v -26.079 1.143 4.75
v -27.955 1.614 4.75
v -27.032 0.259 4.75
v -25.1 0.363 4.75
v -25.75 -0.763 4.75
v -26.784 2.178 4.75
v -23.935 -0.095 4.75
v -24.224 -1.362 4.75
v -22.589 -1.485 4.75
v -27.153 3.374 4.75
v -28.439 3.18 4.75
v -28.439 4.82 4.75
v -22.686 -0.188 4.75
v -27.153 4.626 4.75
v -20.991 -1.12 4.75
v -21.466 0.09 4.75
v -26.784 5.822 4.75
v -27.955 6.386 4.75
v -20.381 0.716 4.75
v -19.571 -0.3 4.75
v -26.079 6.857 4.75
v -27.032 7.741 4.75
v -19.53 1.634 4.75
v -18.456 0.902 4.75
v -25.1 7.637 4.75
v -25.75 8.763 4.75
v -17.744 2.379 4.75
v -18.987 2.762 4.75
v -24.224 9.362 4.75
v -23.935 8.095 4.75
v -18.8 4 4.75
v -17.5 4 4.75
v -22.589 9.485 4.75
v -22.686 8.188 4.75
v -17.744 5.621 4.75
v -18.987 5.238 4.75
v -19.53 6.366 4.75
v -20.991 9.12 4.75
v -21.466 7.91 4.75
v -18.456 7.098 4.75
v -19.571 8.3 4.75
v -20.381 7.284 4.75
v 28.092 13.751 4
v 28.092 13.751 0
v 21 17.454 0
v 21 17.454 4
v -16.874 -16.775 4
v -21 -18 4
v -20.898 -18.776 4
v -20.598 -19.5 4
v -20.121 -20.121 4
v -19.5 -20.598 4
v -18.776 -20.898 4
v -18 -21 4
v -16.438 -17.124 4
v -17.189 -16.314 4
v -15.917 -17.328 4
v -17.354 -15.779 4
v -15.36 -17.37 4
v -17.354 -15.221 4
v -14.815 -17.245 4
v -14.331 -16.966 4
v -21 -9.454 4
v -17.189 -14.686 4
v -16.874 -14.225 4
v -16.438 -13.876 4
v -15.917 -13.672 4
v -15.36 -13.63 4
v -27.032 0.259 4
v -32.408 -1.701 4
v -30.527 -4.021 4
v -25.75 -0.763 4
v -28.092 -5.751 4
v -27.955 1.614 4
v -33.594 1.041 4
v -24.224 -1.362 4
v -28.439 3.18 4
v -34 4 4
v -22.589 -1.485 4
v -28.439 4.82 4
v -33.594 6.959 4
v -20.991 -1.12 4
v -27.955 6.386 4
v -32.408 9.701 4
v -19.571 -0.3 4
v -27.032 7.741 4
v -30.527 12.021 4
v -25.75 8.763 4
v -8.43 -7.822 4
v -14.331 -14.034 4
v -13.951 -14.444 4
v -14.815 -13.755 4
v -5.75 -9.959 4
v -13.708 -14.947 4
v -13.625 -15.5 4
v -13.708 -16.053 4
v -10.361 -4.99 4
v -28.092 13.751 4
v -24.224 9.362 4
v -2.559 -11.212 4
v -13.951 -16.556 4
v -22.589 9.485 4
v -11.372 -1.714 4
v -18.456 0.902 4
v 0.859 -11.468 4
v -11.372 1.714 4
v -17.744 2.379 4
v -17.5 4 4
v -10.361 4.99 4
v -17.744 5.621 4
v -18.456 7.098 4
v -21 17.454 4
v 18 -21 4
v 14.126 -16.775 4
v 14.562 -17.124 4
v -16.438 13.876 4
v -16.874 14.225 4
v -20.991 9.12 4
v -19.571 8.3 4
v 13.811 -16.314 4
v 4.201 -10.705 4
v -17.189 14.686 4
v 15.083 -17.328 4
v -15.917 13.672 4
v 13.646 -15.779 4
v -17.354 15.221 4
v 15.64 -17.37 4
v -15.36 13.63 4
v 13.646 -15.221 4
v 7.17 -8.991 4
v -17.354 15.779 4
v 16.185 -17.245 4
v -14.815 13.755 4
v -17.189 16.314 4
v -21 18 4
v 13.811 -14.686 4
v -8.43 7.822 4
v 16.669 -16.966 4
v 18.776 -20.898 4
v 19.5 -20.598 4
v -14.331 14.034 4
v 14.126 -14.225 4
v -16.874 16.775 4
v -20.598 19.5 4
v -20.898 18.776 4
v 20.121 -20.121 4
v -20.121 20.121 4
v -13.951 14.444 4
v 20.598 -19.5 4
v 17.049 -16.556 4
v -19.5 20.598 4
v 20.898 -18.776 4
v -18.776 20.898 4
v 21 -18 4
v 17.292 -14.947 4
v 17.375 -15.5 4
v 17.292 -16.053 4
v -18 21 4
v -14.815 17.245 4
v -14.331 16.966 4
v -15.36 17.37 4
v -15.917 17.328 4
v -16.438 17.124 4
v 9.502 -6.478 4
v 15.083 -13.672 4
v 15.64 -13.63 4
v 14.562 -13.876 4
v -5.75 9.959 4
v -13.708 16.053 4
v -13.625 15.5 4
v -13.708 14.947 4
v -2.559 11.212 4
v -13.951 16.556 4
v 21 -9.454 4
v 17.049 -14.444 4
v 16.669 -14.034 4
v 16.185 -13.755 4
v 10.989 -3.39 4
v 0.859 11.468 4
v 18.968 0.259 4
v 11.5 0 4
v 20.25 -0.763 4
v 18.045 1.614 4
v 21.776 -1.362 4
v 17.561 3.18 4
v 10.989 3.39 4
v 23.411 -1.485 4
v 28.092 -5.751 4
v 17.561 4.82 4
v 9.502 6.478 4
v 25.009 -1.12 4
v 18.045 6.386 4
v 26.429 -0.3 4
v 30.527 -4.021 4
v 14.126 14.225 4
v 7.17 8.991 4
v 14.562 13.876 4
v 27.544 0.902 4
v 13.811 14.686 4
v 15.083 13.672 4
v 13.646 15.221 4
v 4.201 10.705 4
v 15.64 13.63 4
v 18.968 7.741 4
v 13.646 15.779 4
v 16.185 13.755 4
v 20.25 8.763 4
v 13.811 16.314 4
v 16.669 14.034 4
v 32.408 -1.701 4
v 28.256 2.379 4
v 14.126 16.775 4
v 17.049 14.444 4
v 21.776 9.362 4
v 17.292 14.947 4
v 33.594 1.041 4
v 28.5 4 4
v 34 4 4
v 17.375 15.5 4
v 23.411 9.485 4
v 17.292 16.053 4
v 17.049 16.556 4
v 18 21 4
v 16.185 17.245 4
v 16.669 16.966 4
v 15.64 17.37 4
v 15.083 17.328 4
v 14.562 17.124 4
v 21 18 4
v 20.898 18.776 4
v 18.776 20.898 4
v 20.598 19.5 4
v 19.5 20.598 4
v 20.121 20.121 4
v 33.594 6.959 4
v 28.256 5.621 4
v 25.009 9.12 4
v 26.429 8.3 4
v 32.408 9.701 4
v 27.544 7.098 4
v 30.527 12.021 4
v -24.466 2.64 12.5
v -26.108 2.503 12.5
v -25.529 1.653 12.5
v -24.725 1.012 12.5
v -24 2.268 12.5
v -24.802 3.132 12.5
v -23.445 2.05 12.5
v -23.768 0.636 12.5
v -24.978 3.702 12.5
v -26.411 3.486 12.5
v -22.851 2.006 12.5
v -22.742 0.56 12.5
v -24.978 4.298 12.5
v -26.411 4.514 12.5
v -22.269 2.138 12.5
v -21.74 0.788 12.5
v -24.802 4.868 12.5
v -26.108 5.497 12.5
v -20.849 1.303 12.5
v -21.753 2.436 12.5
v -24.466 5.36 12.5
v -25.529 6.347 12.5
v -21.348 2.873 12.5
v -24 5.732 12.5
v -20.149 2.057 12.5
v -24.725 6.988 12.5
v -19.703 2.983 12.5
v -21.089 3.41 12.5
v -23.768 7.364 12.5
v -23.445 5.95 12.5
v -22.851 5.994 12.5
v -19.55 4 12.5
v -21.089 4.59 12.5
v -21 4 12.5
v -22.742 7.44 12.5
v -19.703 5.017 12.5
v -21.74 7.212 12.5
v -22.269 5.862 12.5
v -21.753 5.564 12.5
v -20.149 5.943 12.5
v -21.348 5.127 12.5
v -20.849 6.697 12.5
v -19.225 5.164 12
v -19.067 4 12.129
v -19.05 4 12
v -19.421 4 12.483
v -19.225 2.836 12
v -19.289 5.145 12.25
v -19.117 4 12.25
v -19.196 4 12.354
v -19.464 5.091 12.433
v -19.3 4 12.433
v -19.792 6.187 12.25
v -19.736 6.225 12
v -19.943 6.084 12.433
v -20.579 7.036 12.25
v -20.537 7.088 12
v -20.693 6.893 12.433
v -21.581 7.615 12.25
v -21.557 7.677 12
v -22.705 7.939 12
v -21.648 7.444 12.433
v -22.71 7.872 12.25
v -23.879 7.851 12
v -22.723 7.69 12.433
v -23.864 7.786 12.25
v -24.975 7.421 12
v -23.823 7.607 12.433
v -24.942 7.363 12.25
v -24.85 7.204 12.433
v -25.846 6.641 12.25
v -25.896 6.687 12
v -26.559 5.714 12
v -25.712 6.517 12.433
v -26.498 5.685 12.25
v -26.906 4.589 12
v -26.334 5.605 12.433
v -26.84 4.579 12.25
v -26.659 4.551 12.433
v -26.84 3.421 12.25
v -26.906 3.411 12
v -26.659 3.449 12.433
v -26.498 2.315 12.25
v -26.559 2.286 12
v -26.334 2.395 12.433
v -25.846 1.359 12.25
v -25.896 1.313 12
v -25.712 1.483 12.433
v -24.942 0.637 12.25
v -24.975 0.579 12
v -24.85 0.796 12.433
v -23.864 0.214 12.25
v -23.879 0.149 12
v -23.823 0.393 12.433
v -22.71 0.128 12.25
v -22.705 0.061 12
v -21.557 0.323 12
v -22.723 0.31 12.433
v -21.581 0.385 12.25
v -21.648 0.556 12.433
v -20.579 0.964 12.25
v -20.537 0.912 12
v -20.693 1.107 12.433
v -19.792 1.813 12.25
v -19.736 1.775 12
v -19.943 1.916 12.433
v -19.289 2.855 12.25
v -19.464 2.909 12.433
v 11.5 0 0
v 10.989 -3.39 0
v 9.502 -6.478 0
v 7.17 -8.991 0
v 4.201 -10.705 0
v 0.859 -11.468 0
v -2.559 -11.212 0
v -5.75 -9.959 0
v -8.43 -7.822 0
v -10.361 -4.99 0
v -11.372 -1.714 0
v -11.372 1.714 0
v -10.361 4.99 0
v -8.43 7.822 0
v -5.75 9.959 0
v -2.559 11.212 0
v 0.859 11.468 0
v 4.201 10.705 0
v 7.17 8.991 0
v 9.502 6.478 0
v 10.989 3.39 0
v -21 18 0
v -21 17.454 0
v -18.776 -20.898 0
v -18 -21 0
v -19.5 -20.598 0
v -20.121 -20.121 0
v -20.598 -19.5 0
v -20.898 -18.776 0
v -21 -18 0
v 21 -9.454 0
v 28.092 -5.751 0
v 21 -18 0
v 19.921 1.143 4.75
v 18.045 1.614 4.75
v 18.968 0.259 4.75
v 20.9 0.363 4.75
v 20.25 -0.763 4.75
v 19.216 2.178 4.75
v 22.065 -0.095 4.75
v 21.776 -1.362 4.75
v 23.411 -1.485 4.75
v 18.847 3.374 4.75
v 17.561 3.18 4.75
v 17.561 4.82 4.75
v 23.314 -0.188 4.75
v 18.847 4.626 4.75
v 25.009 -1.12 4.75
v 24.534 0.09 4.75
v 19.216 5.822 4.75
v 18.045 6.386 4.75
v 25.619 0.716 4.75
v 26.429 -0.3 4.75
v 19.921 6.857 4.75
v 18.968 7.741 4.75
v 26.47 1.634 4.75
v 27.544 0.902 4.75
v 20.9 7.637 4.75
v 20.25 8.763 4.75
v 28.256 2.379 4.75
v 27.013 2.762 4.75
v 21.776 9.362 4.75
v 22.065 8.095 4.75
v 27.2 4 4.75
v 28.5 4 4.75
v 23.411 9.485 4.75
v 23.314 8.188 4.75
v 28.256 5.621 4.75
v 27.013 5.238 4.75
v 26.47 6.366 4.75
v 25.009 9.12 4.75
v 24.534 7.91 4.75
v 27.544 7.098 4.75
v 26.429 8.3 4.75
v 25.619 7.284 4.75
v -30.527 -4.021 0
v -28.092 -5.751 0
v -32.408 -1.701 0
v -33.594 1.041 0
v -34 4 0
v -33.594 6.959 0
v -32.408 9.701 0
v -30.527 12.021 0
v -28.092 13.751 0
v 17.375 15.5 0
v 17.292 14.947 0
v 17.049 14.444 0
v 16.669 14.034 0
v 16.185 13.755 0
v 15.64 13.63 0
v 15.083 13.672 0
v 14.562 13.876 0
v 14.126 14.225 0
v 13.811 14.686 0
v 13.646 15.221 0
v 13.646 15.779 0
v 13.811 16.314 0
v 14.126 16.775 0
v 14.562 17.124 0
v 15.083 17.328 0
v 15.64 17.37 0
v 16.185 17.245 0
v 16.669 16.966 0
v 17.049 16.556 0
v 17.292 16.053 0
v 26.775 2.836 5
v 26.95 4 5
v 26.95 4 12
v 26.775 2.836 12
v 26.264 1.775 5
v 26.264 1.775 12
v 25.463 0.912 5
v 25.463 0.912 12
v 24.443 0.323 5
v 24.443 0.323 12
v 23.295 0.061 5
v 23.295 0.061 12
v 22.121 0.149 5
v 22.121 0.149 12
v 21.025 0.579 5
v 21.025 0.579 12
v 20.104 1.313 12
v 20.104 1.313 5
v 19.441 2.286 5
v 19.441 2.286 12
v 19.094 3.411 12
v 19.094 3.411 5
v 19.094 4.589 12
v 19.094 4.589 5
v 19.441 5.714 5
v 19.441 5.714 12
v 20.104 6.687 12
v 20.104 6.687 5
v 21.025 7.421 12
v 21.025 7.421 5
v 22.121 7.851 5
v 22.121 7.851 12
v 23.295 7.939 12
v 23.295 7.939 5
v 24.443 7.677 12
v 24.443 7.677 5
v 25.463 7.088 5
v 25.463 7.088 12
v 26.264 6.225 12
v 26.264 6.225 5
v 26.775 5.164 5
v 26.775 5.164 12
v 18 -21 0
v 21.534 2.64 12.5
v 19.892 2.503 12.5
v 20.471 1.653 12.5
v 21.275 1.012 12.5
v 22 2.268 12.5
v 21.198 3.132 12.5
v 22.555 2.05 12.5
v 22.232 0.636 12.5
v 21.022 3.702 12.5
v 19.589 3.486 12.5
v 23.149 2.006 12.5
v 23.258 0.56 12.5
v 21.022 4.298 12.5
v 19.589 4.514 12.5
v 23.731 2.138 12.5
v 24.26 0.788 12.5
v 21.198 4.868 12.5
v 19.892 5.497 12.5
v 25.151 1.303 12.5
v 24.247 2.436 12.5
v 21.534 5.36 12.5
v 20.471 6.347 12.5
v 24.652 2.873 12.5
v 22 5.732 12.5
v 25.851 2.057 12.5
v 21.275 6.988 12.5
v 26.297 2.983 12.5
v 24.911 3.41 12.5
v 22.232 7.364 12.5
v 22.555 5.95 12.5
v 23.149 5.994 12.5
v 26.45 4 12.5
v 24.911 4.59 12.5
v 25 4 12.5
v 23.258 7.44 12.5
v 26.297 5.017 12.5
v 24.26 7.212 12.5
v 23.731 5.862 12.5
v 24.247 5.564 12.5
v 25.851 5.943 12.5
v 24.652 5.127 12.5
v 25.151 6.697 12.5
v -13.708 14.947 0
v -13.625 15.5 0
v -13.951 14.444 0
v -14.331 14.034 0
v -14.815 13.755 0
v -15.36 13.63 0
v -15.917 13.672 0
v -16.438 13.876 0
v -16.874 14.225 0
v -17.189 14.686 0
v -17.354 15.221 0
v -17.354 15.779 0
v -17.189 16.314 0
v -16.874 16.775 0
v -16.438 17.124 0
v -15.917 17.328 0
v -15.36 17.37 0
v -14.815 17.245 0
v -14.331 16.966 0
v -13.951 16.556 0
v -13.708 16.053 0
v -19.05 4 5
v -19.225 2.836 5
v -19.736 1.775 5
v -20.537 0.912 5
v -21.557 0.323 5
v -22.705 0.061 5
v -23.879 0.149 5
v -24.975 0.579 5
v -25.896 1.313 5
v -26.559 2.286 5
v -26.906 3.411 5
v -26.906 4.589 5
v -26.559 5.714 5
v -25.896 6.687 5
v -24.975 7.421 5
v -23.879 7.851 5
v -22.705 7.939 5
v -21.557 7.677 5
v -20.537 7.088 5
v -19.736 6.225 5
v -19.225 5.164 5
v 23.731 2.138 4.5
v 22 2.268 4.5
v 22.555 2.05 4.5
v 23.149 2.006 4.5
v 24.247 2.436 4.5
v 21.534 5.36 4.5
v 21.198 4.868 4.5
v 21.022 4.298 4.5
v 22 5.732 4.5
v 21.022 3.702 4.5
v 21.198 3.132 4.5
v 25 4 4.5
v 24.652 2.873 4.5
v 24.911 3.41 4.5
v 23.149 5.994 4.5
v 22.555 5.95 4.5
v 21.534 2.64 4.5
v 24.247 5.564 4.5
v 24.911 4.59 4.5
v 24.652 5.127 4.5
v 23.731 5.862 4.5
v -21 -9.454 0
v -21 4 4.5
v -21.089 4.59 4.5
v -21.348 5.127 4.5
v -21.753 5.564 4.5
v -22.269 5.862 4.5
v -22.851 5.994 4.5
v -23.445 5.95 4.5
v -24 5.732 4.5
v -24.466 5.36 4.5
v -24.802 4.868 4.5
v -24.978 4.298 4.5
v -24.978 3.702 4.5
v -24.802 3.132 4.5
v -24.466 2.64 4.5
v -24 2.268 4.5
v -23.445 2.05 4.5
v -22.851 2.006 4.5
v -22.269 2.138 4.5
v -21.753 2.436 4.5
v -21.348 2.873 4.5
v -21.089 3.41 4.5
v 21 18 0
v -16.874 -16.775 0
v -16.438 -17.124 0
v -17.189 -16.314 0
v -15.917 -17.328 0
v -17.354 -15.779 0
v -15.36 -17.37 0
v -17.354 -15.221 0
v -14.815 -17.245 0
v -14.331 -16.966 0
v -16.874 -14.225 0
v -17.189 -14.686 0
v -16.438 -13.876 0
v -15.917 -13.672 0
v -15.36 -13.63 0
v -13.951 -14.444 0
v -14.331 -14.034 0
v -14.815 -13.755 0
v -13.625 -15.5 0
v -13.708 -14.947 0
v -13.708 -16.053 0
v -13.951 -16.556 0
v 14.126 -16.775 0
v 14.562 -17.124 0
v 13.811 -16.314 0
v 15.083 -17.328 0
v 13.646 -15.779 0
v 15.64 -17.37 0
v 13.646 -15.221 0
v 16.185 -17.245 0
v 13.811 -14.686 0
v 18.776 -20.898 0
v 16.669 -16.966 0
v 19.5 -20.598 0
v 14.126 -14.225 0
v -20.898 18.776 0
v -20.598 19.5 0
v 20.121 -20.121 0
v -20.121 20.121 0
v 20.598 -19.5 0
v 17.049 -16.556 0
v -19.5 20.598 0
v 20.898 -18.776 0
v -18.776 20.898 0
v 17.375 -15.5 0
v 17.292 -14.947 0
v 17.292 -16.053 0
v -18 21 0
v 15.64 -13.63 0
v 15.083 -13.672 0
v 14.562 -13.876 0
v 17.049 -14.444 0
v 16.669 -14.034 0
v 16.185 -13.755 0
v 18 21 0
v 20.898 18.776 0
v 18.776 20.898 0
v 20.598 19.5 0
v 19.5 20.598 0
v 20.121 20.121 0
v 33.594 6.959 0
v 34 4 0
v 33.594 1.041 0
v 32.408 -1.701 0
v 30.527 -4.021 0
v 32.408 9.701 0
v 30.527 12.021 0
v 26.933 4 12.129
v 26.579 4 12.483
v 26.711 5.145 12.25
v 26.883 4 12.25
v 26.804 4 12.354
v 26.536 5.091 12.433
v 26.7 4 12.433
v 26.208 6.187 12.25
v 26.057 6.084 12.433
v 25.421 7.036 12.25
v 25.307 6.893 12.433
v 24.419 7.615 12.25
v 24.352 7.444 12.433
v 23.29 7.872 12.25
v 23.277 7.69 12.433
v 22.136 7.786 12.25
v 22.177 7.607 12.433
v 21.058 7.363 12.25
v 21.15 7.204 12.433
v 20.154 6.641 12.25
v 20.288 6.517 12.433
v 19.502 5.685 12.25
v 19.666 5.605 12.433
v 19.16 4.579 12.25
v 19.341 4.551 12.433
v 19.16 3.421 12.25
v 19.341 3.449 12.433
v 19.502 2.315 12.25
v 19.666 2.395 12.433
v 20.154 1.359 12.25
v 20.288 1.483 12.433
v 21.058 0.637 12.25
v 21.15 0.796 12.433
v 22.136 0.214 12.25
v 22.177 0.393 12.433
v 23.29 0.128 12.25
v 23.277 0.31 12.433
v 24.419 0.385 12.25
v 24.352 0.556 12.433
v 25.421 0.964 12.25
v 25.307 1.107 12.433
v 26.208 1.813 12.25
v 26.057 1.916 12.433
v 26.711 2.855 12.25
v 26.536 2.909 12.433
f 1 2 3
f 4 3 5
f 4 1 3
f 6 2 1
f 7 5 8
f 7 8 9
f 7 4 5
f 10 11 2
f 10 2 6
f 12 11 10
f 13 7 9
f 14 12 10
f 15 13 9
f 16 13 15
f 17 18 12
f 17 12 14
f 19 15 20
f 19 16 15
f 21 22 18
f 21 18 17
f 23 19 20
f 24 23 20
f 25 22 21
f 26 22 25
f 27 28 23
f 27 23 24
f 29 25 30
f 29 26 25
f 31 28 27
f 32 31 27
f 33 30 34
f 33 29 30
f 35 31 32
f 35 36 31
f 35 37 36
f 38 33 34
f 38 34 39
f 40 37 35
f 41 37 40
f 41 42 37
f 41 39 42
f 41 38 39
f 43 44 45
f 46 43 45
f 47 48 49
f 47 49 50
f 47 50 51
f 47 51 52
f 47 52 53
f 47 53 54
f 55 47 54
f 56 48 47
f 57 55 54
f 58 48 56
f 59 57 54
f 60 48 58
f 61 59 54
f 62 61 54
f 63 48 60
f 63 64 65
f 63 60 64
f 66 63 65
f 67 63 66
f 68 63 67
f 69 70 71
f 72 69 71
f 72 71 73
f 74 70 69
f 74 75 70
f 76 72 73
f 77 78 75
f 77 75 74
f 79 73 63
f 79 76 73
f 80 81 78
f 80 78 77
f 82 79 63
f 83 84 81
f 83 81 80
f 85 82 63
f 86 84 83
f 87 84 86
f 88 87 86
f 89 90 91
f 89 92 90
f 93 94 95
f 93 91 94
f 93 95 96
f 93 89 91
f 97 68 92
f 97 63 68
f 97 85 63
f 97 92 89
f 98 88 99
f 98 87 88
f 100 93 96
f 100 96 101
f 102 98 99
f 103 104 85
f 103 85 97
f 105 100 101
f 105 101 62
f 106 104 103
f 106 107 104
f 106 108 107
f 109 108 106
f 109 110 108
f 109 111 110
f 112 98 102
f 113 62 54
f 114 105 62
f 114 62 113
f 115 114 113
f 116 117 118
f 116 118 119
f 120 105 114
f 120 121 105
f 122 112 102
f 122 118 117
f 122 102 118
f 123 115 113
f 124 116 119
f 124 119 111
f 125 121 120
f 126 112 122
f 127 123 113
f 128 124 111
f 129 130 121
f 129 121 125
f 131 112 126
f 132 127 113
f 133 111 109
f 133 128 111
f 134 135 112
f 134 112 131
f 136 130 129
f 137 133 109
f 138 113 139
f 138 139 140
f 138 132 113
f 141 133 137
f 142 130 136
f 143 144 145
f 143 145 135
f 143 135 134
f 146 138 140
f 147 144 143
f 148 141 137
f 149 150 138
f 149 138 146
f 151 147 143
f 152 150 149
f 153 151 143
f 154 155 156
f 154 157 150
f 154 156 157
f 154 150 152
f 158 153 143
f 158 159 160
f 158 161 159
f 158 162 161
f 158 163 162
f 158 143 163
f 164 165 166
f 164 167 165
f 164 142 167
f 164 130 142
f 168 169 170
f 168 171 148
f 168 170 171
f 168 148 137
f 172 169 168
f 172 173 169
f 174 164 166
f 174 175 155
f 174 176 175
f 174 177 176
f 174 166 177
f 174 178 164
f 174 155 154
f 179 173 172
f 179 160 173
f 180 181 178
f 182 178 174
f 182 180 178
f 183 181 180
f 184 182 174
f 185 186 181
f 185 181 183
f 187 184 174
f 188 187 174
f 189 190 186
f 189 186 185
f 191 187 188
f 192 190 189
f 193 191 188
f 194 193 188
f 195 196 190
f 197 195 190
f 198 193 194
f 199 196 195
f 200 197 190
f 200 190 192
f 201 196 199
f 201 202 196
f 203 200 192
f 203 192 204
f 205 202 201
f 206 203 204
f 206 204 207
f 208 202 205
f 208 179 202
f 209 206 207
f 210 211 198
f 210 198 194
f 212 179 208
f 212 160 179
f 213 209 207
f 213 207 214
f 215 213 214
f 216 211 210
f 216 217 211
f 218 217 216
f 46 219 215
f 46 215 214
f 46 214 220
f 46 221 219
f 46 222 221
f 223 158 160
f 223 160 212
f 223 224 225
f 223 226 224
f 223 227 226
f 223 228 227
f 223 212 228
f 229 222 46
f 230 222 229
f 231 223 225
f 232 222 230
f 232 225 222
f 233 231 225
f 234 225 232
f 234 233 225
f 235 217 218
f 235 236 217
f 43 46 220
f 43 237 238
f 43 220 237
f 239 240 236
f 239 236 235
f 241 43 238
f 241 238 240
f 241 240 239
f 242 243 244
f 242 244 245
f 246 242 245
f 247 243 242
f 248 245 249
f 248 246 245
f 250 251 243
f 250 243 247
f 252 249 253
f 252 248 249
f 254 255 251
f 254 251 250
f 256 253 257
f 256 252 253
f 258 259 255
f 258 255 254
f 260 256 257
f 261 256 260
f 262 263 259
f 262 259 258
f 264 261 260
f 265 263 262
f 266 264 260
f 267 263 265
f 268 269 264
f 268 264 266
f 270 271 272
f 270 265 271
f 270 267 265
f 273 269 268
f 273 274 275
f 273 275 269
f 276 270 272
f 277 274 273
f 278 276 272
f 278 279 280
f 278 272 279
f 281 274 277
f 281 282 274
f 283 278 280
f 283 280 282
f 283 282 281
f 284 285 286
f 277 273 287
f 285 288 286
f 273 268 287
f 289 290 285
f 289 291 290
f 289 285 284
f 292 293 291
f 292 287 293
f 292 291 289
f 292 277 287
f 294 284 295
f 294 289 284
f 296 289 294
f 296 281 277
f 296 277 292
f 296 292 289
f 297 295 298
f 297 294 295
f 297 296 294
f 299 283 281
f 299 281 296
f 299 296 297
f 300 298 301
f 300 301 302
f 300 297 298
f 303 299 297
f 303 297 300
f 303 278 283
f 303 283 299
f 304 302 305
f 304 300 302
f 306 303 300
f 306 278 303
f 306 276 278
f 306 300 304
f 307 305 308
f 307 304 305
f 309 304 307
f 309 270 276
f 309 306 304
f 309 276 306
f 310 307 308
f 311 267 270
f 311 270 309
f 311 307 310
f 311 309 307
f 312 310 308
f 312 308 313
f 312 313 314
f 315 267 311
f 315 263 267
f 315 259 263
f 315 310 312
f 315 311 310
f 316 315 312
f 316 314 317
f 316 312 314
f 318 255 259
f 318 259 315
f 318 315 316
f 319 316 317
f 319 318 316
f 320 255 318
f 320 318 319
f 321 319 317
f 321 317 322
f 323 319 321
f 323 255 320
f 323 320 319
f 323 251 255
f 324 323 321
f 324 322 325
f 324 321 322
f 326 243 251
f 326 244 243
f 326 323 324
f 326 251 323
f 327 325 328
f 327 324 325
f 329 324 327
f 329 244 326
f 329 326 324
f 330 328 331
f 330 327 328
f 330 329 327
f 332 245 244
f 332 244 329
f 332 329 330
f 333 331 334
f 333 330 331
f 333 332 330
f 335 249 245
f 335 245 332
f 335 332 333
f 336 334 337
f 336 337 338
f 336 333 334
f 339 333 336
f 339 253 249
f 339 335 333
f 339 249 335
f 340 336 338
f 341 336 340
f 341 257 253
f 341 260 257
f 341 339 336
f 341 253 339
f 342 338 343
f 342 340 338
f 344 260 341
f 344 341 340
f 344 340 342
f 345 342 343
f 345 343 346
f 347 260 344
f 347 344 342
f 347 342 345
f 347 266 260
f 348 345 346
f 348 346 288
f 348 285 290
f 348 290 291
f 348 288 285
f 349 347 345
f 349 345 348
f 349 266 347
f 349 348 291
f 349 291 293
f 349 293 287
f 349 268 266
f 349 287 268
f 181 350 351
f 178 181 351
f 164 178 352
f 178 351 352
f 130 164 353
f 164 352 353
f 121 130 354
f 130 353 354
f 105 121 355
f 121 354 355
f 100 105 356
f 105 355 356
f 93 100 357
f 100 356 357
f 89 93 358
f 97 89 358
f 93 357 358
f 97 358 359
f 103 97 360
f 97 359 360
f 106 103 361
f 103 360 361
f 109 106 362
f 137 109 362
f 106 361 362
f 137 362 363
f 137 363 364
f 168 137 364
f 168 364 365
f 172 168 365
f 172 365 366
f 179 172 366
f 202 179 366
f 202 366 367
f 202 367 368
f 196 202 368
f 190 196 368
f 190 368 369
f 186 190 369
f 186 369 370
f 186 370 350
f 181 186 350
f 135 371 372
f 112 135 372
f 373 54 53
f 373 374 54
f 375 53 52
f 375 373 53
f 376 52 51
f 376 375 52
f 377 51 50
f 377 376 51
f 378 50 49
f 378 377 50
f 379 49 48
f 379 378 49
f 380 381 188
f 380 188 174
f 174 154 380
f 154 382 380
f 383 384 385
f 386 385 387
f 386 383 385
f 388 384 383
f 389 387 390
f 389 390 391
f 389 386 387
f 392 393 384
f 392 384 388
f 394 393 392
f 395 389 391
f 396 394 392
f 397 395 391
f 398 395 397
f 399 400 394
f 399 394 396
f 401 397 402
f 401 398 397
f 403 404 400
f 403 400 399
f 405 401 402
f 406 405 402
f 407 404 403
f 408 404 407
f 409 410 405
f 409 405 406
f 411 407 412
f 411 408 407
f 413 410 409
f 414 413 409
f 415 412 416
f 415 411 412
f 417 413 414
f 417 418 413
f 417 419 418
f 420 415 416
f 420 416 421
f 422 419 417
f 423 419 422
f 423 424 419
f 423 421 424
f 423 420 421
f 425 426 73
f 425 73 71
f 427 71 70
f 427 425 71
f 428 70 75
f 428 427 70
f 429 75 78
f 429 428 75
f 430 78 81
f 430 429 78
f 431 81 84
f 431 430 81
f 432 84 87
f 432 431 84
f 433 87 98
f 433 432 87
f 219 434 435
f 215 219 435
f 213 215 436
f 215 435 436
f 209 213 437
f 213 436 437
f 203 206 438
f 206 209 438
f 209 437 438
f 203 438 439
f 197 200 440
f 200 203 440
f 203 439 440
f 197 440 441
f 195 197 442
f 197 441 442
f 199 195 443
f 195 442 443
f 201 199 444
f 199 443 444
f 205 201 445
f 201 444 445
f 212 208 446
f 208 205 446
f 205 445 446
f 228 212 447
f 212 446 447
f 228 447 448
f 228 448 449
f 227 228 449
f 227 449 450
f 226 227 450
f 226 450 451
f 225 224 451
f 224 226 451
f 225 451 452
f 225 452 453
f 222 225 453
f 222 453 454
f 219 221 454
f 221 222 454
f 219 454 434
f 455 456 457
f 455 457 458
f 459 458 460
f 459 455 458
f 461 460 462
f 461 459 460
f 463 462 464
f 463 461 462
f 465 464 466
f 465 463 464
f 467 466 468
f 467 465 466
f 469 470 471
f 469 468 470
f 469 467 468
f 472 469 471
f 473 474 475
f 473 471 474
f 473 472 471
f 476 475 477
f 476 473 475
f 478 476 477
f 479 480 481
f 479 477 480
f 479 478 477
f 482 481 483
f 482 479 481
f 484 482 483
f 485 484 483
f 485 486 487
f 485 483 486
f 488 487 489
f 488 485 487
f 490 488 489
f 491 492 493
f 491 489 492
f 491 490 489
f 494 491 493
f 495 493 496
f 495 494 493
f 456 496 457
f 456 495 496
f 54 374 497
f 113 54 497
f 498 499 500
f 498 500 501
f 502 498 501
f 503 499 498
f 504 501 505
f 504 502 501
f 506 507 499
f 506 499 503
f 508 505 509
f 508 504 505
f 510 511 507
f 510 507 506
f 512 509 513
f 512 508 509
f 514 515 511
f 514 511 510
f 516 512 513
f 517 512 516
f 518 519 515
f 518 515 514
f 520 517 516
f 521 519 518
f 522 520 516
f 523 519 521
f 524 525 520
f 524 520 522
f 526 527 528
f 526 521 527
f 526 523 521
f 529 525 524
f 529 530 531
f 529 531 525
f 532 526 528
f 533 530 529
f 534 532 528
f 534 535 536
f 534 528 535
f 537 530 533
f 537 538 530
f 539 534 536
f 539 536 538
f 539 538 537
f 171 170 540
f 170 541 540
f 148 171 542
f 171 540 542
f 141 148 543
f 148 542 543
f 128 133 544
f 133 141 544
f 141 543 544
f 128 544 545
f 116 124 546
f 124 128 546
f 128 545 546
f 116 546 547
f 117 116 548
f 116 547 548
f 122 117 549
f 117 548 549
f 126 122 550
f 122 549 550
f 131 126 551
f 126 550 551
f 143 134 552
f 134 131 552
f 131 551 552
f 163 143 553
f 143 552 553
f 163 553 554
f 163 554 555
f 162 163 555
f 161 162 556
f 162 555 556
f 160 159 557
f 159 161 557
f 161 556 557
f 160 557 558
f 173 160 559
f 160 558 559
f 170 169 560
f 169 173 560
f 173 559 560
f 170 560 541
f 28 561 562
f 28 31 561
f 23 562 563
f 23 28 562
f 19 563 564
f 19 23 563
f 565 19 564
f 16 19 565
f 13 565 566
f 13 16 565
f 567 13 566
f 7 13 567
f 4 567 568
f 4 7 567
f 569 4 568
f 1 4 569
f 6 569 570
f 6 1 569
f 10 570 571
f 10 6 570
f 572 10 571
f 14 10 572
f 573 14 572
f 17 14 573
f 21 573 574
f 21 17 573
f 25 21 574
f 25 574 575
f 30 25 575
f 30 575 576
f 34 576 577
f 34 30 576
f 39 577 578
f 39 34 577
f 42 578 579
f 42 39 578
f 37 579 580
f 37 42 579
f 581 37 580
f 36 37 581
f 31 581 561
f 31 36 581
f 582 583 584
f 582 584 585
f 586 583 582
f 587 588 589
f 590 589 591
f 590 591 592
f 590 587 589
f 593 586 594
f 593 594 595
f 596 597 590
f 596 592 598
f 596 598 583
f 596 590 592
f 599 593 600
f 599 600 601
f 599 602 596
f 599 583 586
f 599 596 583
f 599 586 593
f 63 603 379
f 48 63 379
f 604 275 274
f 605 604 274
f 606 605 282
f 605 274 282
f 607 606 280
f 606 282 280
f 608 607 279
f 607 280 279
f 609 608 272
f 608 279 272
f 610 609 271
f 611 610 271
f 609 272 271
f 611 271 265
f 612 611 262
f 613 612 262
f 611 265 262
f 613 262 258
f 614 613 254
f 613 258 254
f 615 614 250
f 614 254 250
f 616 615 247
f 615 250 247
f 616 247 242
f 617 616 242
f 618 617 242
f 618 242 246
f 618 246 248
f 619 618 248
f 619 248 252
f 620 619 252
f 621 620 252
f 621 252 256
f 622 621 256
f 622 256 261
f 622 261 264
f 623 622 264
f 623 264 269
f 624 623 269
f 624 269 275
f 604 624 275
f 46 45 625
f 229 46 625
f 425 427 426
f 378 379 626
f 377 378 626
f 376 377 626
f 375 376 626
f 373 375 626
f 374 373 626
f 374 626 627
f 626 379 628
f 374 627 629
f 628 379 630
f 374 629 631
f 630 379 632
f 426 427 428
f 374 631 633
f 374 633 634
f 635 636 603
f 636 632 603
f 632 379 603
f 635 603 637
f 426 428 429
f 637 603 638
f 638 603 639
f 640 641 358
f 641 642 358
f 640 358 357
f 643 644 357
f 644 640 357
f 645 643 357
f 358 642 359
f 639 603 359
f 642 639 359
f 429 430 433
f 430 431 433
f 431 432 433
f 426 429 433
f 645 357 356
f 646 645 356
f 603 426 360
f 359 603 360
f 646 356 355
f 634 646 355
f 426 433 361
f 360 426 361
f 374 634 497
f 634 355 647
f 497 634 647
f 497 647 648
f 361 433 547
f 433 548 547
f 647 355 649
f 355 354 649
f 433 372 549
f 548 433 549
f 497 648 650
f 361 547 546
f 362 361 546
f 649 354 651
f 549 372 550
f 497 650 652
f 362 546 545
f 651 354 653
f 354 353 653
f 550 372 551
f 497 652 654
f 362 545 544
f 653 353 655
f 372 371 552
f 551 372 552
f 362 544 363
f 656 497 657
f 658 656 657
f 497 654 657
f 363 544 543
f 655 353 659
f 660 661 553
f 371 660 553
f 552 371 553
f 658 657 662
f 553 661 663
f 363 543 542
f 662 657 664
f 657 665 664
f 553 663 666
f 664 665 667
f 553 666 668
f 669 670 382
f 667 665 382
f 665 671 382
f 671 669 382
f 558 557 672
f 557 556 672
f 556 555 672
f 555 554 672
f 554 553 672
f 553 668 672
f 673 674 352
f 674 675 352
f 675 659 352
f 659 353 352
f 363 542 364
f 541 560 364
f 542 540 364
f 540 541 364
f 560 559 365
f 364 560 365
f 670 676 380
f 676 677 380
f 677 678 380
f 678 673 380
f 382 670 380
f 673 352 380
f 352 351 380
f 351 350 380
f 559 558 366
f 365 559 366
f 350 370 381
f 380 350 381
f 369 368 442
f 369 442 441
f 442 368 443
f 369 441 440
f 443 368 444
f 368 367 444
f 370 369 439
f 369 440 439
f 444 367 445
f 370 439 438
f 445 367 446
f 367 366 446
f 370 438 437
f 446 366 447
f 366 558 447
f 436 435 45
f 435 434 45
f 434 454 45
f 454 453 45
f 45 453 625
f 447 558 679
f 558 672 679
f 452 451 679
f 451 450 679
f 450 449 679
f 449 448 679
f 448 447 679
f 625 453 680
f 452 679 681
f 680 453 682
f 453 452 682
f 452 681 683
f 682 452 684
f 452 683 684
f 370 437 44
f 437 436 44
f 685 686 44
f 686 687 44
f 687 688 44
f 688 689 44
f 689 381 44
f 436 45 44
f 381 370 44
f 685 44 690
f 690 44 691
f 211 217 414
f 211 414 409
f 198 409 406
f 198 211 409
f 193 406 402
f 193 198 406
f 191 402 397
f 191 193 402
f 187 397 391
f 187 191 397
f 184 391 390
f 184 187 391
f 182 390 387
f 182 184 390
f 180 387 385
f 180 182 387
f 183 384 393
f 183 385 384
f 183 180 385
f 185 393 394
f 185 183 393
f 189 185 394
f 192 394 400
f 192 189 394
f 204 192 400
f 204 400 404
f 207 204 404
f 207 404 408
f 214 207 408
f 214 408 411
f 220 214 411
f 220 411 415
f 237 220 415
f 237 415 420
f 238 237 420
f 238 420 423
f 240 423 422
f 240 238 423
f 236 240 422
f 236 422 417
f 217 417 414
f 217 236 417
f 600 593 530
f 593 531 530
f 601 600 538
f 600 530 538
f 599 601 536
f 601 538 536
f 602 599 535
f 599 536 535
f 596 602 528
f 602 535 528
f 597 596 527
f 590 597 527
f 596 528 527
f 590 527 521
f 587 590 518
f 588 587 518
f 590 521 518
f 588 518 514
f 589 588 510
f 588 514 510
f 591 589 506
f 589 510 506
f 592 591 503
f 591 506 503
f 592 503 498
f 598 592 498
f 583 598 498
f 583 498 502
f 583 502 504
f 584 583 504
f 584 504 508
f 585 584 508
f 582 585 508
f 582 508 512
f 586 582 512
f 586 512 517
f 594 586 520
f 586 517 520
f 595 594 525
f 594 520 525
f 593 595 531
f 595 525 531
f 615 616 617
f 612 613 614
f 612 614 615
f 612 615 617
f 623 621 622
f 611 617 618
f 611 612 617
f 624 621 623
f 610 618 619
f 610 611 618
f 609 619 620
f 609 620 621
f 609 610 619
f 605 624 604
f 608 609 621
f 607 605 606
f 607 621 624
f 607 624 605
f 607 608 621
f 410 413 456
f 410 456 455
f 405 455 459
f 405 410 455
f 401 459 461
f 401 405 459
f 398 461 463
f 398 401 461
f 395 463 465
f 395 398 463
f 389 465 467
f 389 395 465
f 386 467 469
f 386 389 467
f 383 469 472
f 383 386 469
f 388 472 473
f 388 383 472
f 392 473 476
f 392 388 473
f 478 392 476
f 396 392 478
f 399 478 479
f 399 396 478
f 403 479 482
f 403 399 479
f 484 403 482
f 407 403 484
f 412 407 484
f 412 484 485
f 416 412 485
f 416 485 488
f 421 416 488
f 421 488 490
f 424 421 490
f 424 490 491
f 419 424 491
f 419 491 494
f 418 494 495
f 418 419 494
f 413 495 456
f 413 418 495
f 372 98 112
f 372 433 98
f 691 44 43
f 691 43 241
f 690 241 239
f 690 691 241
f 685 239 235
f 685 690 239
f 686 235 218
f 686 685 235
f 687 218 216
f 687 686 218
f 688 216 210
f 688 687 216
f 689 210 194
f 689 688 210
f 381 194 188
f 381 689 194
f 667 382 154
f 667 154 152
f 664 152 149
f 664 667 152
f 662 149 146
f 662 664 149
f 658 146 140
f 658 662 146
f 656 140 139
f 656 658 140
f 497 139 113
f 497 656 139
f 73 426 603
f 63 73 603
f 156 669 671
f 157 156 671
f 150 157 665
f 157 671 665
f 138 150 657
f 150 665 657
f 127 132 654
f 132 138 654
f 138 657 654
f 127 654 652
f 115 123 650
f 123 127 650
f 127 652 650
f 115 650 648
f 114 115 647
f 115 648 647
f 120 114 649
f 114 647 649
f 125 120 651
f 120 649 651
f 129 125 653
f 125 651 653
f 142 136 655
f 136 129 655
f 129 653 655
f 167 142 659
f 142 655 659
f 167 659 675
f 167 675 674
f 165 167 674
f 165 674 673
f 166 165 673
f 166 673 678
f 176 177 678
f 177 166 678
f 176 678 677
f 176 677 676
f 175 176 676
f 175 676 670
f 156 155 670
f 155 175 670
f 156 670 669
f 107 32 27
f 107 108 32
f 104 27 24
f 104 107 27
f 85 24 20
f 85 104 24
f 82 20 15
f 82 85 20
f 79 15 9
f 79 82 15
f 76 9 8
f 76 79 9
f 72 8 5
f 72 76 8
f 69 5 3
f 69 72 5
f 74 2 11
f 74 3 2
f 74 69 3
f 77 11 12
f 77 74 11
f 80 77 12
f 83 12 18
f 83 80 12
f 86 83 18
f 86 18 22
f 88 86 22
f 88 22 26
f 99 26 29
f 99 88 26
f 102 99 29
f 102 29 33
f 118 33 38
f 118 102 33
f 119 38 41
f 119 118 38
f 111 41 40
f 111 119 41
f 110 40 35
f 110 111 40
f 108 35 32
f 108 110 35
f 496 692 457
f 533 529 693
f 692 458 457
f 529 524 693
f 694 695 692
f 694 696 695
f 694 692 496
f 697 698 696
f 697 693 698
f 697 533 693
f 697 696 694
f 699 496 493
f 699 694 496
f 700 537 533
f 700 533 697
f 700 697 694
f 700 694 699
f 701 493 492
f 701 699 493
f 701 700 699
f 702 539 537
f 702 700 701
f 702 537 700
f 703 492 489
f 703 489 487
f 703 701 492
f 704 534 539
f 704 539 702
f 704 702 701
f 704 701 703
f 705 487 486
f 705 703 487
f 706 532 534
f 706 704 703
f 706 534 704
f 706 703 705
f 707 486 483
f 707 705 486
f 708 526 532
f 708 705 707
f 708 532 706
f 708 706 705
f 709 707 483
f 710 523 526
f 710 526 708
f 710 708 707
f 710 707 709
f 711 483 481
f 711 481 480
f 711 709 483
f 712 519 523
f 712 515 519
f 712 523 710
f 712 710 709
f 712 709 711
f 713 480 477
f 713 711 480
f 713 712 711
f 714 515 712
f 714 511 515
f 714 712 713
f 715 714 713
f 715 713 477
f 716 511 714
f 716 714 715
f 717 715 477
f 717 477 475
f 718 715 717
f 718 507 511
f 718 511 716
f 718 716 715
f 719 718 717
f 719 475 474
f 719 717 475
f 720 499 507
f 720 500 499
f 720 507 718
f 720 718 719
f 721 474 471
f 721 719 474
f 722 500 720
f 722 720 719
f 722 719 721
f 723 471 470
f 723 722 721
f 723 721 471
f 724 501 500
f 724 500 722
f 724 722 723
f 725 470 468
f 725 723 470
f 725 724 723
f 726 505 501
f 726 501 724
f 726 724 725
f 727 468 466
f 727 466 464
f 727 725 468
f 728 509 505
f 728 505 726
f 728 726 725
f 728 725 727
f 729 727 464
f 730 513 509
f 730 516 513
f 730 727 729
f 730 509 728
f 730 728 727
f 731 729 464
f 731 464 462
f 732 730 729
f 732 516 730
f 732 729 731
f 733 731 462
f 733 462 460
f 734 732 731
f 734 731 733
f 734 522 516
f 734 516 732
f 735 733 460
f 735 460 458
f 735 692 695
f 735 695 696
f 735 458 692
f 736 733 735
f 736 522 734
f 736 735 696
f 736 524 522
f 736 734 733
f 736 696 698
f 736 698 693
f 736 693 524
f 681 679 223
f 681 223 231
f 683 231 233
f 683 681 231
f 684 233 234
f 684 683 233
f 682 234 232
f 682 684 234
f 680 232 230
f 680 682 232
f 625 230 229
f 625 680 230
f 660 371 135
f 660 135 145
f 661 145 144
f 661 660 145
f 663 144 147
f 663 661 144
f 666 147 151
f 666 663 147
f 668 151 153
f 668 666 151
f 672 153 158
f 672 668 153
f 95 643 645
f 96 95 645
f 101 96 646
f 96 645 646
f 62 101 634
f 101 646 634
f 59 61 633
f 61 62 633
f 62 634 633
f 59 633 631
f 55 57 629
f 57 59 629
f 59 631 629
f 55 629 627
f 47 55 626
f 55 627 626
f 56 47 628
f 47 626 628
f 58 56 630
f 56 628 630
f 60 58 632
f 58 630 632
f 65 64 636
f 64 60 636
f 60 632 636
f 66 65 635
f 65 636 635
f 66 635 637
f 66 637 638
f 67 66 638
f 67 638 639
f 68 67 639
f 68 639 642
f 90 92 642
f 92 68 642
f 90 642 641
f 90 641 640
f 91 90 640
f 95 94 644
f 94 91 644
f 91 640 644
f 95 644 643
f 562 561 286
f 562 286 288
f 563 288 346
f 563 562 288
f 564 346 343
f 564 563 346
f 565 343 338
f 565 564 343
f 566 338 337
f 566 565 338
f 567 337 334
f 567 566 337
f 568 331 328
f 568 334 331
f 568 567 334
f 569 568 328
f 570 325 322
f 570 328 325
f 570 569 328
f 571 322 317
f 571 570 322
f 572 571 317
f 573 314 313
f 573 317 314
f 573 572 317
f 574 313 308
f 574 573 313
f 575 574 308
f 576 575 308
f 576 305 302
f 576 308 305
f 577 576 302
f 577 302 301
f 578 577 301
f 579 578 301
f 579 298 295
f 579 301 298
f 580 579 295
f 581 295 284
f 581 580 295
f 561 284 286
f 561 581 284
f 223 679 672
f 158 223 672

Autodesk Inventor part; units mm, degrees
ref_plane "YZ Plane" through (0, 0, 0) normal (1, 0, 0) x (0, 1, 0)
ref_plane "XZ Plane" through (0, 0, 0) normal (0, 1, 0) x (-1, 0, 0)
ref_plane "XY Plane" through (0, 0, 0) normal (0, 0, 1) x (1, 0, 0)
sketch "Sketch1" plane through (0, 0, 0) normal (0, 0, 1) x (1, 0, 0)
  circle A0 centre (0, 0) radius 11.5
  line L0 (-18, -21) -> (18, -21)
  line L1 (21, -18) -> (21, 18)
  line L2 (18, 21) -> (-18, 21)
  line L3 (-21, 18) -> (-21, -18)
  line L4 (-21, -21) -> (21, 21) construction
  line L5 (21, -21) -> (-21, 21) construction
  circle A1 centre (-15.5, 15.5) radius 1.875
  circle A2 centre (15.5, 15.5) radius 1.875
  circle A3 centre (15.5, -15.5) radius 1.875
  circle A4 centre (-15.5, -15.5) radius 1.875
  line L6 (-15.5, 15.5) -> (15.5, 15.5) construction
  line L7 (15.5, 15.5) -> (15.5, -15.5) construction
  line L8 (15.5, -15.5) -> (-15.5, -15.5) construction
  line L9 (-15.5, 15.5) -> (-15.5, -15.5) construction
  line L10 (-15.5, 15.5) -> (15.5, -15.5) construction
  line L11 (15.5, 15.5) -> (0, 0) construction
  circle A5 centre (-23, 4) radius 3.95
  circle A6 centre (23, 4) radius 3.95
  circle A7 centre (-23, 4) radius 11
  circle A8 centre (23, 4) radius 11
  line L12 (0, 126.4593) -> (0, -125.5407) projected
  line L13 (-111.8366, 0) -> (126.1634, 0) projected
  circle A9 centre (-48.8366, 35.9593) radius 2.0625 projected
  circle A10 centre (-57.8366, 80.4593) radius 2.0625 projected
  circle A11 centre (-66.8366, 35.9593) radius 2.0625 projected
  circle A12 centre (-66.8366, 60.9593) radius 2.0625 projected
  circle A13 centre (-48.8366, 60.9593) radius 2.0625 projected
  circle A14 centre (63.1634, 35.9593) radius 2.0625 projected
  circle A15 centre (72.1634, 80.4593) radius 2.0625 projected
  circle A16 centre (81.1634, 35.9593) radius 2.0625 projected
  circle A17 centre (81.1634, 60.9593) radius 2.0625 projected
  circle A18 centre (63.1634, 60.9593) radius 2.0625 projected
  circle A19 centre (-48.8366, -35.0407) radius 2.0625 projected
  circle A20 centre (-57.8366, -79.5407) radius 2.0625 projected
  circle A21 centre (-66.8366, -35.0407) radius 2.0625 projected
  circle A22 centre (-66.8366, -60.0407) radius 2.0625 projected
  circle A23 centre (-48.8366, -60.0407) radius 2.0625 projected
  circle A24 centre (63.1634, -35.0407) radius 2.0625 projected
  circle A25 centre (63.1634, -60.0407) radius 2.0625 projected
  circle A26 centre (81.1634, -60.0407) radius 2.0625 projected
  circle A27 centre (81.1634, -35.0407) radius 2.0625 projected
  circle A28 centre (72.1634, -79.5407) radius 2.0625 projected
  line L14 (92.1634, -89.5407) -> (92.1634, 90.4593) projected
  line L15 (92.1634, 90.4593) -> (-77.8366, 90.4593) projected
  line L16 (-77.8366, 90.4593) -> (-77.8366, -89.5407) projected
  line L17 (-77.8366, -89.5407) -> (92.1634, -89.5407) projected
  circle A29 centre (-48.8366, 35.9593) radius 2.0625 projected
  circle A30 centre (-57.8366, 80.4593) radius 2.0625 projected
  circle A31 centre (-66.8366, 35.9593) radius 2.0625 projected
  circle A32 centre (-66.8366, 60.9593) radius 2.0625 projected
  circle A33 centre (-48.8366, 60.9593) radius 2.0625 projected
  circle A34 centre (63.1634, 35.9593) radius 2.0625 projected
  circle A35 centre (72.1634, 80.4593) radius 2.0625 projected
  circle A36 centre (81.1634, 35.9593) radius 2.0625 projected
  circle A37 centre (81.1634, 60.9593) radius 2.0625 projected
  circle A38 centre (63.1634, 60.9593) radius 2.0625 projected
  circle A39 centre (-48.8366, -35.0407) radius 2.0625 projected
  circle A40 centre (-57.8366, -79.5407) radius 2.0625 projected
  circle A41 centre (-66.8366, -35.0407) radius 2.0625 projected
  circle A42 centre (-66.8366, -60.0407) radius 2.0625 projected
  circle A43 centre (-48.8366, -60.0407) radius 2.0625 projected
  circle A44 centre (63.1634, -35.0407) radius 2.0625 projected
  circle A45 centre (63.1634, -60.0407) radius 2.0625 projected
  circle A46 centre (81.1634, -60.0407) radius 2.0625 projected
  circle A47 centre (81.1634, -35.0407) radius 2.0625 projected
  circle A48 centre (72.1634, -79.5407) radius 2.0625 projected
  line L18 (92.1634, -89.5407) -> (92.1634, 90.4593) projected
  line L19 (92.1634, 90.4593) -> (-77.8366, 90.4593) projected
  line L20 (-77.8366, 90.4593) -> (-77.8366, -89.5407) projected
  line L21 (-77.8366, -89.5407) -> (92.1634, -89.5407) projected
  arc A49 (-18, 21) -> (-21, 18) centre (-18, 18) ccw
  arc A50 (21, 18) -> (18, 21) centre (18, 18) ccw
  arc A51 (18, -21) -> (21, -18) centre (18, -18) ccw
  arc A52 (-21, -18) -> (-18, -21) centre (-18, -18) ccw
  line L22 (-28.0915, -5.7507) -> (-21, -9.4536)
  line L23 (-28.0915, 13.7507) -> (-21, 17.4536)
  line L24 (28.0915, -5.7507) -> (21, -9.4536)
  line L25 (28.0915, 13.7507) -> (21, 17.4536)
  circle A53 centre (-23, 4) radius 5.5
  circle A54 centre (23, 4) radius 5.5
  dimension "d0" = 23
  dimension "d1" = 3.75
  dimension "d2" = 31
  dimension "d3" = 31
  dimension "d4" = 22
  dimension "d5" = 42
  dimension "d6" = 42
  dimension "d7" = 23
  dimension "d8" = 4
  dimension "d9" = 7.9
  dimension "d10" = 3
  dimension "d11" = 8
  dimension "d12" = 11
extrude "Extrusion1" add sketch "Sketch1" along normal blind 4 contours L13 A8 L1 A51 L0 L12 A0 | A0 L12 L2 A50 L1 A8 L13 | A0 L13 A7 L3 A49 L2 L12 | L12 L0 A52 L3 A7 L13 A0 | L13 A54 L1 A8 | A8 L1 A54 L13 | A8 L13 A54 L1 | L1 L25 A8 | A8 L24 L1 | L1 A54 L13 A8 | A54 L1 A6 L13 | L13 L1 A54 | L13 A53 L3 A7 | A7 L3 A53 L13 | A54 L13 L1 A6 | L1 L13 A54 | A7 L13 A53 L3 | L3 L22 A7 | A53 L3 L13 | L13 L3 A5 A53 | A6 L1 | L1 A6 | A53 L13 L3 | A7 L23 L3 | L3 A53 L13 A7 | L13 A53 L3 A5 | A5 L3 | L3 A5
sketch "Sketch2" plane through (0, 0, 4) normal (0, 0, 1) x (1, 0, 0)
  circle A0 centre (0, 0) radius 11.5 projected
  circle A1 centre (-15.5, -15.5) radius 1.875 projected
  circle A2 centre (15.5, -15.5) radius 1.875 projected
  circle A3 centre (15.5, 15.5) radius 1.875 projected
  circle A4 centre (-15.5, 15.5) radius 1.875 projected
  line L0 (28.0915, 13.7507) -> (21, 17.4536) projected
  line L1 (21, 17.4536) -> (21, 18) projected
  arc A5 (21, 18) -> (18, 21) centre (18, 18) ccw projected
  line L2 (18, 21) -> (-18, 21) projected
  arc A6 (-18, 21) -> (-21, 18) centre (-18, 18) ccw projected
  line L3 (-21, 18) -> (-21, 17.4536) projected
  line L4 (-21, 17.4536) -> (-28.0915, 13.7507) projected
  arc A7 (-28.0915, 13.7507) -> (-28.0915, -5.7507) centre (-23, 4) ccw projected
  line L5 (-28.0915, -5.7507) -> (-21, -9.4536) projected
  line L6 (-21, -9.4536) -> (-21, -18) projected
  arc A8 (-21, -18) -> (-18, -21) centre (-18, -18) ccw projected
  line L7 (-18, -21) -> (18, -21) projected
  arc A9 (18, -21) -> (21, -18) centre (18, -18) ccw projected
  line L8 (21, -18) -> (21, -9.4536) projected
  line L9 (21, -9.4536) -> (28.0915, -5.7507) projected
  arc A10 (28.0915, -5.7507) -> (28.0915, 13.7507) centre (23, 4) ccw projected
  circle A11 centre (23, 4) radius 5.5
  circle A12 centre (-23, 4) radius 5.5
  circle A13 centre (23, 4) radius 3.95
  circle A14 centre (-23, 4) radius 3.95
  dimension "d15" = 11
  dimension "d16" = 7.9
  dimension "d17" = 7.9
  dimension "d18" = 11
extrude "Extrusion2" add sketch "Sketch2" along normal blind 8.5 contours A13 | A14
extrude "Extrusion3" add sketch "Sketch2" along normal blind 0.75 contours A11 | A12
fillet "Fillet1" radius 0.5 2 edges at (19.05, 4, 12.5) (-26.95, 4, 12.5)
sketch "Sketch3" plane through (23, 4, 12.5) normal (0, 0, 1) x (1, 0, 0)
  circle A0 centre (0, 0) radius 3.45 projected
  circle A1 centre (-46, 0) radius 3.45 projected
  circle A2 centre (0, 0) radius 2
  circle A3 centre (-46, 0) radius 2
  point P0 (-23, -4)
  dimension "d24" = 4
extrude "Extrusion4" cut sketch "Sketch3" against normal blind 8 contours A2 | A3
chamfer "Chamfer1" distance 0.25 angle 45 1 edges at (-26.95, 4, 4.75)
chamfer "Chamfer2" distance 0.25 angle 45 1 edges at (19.05, 4, 4.75)
properties part number "Stepper Atachments"
